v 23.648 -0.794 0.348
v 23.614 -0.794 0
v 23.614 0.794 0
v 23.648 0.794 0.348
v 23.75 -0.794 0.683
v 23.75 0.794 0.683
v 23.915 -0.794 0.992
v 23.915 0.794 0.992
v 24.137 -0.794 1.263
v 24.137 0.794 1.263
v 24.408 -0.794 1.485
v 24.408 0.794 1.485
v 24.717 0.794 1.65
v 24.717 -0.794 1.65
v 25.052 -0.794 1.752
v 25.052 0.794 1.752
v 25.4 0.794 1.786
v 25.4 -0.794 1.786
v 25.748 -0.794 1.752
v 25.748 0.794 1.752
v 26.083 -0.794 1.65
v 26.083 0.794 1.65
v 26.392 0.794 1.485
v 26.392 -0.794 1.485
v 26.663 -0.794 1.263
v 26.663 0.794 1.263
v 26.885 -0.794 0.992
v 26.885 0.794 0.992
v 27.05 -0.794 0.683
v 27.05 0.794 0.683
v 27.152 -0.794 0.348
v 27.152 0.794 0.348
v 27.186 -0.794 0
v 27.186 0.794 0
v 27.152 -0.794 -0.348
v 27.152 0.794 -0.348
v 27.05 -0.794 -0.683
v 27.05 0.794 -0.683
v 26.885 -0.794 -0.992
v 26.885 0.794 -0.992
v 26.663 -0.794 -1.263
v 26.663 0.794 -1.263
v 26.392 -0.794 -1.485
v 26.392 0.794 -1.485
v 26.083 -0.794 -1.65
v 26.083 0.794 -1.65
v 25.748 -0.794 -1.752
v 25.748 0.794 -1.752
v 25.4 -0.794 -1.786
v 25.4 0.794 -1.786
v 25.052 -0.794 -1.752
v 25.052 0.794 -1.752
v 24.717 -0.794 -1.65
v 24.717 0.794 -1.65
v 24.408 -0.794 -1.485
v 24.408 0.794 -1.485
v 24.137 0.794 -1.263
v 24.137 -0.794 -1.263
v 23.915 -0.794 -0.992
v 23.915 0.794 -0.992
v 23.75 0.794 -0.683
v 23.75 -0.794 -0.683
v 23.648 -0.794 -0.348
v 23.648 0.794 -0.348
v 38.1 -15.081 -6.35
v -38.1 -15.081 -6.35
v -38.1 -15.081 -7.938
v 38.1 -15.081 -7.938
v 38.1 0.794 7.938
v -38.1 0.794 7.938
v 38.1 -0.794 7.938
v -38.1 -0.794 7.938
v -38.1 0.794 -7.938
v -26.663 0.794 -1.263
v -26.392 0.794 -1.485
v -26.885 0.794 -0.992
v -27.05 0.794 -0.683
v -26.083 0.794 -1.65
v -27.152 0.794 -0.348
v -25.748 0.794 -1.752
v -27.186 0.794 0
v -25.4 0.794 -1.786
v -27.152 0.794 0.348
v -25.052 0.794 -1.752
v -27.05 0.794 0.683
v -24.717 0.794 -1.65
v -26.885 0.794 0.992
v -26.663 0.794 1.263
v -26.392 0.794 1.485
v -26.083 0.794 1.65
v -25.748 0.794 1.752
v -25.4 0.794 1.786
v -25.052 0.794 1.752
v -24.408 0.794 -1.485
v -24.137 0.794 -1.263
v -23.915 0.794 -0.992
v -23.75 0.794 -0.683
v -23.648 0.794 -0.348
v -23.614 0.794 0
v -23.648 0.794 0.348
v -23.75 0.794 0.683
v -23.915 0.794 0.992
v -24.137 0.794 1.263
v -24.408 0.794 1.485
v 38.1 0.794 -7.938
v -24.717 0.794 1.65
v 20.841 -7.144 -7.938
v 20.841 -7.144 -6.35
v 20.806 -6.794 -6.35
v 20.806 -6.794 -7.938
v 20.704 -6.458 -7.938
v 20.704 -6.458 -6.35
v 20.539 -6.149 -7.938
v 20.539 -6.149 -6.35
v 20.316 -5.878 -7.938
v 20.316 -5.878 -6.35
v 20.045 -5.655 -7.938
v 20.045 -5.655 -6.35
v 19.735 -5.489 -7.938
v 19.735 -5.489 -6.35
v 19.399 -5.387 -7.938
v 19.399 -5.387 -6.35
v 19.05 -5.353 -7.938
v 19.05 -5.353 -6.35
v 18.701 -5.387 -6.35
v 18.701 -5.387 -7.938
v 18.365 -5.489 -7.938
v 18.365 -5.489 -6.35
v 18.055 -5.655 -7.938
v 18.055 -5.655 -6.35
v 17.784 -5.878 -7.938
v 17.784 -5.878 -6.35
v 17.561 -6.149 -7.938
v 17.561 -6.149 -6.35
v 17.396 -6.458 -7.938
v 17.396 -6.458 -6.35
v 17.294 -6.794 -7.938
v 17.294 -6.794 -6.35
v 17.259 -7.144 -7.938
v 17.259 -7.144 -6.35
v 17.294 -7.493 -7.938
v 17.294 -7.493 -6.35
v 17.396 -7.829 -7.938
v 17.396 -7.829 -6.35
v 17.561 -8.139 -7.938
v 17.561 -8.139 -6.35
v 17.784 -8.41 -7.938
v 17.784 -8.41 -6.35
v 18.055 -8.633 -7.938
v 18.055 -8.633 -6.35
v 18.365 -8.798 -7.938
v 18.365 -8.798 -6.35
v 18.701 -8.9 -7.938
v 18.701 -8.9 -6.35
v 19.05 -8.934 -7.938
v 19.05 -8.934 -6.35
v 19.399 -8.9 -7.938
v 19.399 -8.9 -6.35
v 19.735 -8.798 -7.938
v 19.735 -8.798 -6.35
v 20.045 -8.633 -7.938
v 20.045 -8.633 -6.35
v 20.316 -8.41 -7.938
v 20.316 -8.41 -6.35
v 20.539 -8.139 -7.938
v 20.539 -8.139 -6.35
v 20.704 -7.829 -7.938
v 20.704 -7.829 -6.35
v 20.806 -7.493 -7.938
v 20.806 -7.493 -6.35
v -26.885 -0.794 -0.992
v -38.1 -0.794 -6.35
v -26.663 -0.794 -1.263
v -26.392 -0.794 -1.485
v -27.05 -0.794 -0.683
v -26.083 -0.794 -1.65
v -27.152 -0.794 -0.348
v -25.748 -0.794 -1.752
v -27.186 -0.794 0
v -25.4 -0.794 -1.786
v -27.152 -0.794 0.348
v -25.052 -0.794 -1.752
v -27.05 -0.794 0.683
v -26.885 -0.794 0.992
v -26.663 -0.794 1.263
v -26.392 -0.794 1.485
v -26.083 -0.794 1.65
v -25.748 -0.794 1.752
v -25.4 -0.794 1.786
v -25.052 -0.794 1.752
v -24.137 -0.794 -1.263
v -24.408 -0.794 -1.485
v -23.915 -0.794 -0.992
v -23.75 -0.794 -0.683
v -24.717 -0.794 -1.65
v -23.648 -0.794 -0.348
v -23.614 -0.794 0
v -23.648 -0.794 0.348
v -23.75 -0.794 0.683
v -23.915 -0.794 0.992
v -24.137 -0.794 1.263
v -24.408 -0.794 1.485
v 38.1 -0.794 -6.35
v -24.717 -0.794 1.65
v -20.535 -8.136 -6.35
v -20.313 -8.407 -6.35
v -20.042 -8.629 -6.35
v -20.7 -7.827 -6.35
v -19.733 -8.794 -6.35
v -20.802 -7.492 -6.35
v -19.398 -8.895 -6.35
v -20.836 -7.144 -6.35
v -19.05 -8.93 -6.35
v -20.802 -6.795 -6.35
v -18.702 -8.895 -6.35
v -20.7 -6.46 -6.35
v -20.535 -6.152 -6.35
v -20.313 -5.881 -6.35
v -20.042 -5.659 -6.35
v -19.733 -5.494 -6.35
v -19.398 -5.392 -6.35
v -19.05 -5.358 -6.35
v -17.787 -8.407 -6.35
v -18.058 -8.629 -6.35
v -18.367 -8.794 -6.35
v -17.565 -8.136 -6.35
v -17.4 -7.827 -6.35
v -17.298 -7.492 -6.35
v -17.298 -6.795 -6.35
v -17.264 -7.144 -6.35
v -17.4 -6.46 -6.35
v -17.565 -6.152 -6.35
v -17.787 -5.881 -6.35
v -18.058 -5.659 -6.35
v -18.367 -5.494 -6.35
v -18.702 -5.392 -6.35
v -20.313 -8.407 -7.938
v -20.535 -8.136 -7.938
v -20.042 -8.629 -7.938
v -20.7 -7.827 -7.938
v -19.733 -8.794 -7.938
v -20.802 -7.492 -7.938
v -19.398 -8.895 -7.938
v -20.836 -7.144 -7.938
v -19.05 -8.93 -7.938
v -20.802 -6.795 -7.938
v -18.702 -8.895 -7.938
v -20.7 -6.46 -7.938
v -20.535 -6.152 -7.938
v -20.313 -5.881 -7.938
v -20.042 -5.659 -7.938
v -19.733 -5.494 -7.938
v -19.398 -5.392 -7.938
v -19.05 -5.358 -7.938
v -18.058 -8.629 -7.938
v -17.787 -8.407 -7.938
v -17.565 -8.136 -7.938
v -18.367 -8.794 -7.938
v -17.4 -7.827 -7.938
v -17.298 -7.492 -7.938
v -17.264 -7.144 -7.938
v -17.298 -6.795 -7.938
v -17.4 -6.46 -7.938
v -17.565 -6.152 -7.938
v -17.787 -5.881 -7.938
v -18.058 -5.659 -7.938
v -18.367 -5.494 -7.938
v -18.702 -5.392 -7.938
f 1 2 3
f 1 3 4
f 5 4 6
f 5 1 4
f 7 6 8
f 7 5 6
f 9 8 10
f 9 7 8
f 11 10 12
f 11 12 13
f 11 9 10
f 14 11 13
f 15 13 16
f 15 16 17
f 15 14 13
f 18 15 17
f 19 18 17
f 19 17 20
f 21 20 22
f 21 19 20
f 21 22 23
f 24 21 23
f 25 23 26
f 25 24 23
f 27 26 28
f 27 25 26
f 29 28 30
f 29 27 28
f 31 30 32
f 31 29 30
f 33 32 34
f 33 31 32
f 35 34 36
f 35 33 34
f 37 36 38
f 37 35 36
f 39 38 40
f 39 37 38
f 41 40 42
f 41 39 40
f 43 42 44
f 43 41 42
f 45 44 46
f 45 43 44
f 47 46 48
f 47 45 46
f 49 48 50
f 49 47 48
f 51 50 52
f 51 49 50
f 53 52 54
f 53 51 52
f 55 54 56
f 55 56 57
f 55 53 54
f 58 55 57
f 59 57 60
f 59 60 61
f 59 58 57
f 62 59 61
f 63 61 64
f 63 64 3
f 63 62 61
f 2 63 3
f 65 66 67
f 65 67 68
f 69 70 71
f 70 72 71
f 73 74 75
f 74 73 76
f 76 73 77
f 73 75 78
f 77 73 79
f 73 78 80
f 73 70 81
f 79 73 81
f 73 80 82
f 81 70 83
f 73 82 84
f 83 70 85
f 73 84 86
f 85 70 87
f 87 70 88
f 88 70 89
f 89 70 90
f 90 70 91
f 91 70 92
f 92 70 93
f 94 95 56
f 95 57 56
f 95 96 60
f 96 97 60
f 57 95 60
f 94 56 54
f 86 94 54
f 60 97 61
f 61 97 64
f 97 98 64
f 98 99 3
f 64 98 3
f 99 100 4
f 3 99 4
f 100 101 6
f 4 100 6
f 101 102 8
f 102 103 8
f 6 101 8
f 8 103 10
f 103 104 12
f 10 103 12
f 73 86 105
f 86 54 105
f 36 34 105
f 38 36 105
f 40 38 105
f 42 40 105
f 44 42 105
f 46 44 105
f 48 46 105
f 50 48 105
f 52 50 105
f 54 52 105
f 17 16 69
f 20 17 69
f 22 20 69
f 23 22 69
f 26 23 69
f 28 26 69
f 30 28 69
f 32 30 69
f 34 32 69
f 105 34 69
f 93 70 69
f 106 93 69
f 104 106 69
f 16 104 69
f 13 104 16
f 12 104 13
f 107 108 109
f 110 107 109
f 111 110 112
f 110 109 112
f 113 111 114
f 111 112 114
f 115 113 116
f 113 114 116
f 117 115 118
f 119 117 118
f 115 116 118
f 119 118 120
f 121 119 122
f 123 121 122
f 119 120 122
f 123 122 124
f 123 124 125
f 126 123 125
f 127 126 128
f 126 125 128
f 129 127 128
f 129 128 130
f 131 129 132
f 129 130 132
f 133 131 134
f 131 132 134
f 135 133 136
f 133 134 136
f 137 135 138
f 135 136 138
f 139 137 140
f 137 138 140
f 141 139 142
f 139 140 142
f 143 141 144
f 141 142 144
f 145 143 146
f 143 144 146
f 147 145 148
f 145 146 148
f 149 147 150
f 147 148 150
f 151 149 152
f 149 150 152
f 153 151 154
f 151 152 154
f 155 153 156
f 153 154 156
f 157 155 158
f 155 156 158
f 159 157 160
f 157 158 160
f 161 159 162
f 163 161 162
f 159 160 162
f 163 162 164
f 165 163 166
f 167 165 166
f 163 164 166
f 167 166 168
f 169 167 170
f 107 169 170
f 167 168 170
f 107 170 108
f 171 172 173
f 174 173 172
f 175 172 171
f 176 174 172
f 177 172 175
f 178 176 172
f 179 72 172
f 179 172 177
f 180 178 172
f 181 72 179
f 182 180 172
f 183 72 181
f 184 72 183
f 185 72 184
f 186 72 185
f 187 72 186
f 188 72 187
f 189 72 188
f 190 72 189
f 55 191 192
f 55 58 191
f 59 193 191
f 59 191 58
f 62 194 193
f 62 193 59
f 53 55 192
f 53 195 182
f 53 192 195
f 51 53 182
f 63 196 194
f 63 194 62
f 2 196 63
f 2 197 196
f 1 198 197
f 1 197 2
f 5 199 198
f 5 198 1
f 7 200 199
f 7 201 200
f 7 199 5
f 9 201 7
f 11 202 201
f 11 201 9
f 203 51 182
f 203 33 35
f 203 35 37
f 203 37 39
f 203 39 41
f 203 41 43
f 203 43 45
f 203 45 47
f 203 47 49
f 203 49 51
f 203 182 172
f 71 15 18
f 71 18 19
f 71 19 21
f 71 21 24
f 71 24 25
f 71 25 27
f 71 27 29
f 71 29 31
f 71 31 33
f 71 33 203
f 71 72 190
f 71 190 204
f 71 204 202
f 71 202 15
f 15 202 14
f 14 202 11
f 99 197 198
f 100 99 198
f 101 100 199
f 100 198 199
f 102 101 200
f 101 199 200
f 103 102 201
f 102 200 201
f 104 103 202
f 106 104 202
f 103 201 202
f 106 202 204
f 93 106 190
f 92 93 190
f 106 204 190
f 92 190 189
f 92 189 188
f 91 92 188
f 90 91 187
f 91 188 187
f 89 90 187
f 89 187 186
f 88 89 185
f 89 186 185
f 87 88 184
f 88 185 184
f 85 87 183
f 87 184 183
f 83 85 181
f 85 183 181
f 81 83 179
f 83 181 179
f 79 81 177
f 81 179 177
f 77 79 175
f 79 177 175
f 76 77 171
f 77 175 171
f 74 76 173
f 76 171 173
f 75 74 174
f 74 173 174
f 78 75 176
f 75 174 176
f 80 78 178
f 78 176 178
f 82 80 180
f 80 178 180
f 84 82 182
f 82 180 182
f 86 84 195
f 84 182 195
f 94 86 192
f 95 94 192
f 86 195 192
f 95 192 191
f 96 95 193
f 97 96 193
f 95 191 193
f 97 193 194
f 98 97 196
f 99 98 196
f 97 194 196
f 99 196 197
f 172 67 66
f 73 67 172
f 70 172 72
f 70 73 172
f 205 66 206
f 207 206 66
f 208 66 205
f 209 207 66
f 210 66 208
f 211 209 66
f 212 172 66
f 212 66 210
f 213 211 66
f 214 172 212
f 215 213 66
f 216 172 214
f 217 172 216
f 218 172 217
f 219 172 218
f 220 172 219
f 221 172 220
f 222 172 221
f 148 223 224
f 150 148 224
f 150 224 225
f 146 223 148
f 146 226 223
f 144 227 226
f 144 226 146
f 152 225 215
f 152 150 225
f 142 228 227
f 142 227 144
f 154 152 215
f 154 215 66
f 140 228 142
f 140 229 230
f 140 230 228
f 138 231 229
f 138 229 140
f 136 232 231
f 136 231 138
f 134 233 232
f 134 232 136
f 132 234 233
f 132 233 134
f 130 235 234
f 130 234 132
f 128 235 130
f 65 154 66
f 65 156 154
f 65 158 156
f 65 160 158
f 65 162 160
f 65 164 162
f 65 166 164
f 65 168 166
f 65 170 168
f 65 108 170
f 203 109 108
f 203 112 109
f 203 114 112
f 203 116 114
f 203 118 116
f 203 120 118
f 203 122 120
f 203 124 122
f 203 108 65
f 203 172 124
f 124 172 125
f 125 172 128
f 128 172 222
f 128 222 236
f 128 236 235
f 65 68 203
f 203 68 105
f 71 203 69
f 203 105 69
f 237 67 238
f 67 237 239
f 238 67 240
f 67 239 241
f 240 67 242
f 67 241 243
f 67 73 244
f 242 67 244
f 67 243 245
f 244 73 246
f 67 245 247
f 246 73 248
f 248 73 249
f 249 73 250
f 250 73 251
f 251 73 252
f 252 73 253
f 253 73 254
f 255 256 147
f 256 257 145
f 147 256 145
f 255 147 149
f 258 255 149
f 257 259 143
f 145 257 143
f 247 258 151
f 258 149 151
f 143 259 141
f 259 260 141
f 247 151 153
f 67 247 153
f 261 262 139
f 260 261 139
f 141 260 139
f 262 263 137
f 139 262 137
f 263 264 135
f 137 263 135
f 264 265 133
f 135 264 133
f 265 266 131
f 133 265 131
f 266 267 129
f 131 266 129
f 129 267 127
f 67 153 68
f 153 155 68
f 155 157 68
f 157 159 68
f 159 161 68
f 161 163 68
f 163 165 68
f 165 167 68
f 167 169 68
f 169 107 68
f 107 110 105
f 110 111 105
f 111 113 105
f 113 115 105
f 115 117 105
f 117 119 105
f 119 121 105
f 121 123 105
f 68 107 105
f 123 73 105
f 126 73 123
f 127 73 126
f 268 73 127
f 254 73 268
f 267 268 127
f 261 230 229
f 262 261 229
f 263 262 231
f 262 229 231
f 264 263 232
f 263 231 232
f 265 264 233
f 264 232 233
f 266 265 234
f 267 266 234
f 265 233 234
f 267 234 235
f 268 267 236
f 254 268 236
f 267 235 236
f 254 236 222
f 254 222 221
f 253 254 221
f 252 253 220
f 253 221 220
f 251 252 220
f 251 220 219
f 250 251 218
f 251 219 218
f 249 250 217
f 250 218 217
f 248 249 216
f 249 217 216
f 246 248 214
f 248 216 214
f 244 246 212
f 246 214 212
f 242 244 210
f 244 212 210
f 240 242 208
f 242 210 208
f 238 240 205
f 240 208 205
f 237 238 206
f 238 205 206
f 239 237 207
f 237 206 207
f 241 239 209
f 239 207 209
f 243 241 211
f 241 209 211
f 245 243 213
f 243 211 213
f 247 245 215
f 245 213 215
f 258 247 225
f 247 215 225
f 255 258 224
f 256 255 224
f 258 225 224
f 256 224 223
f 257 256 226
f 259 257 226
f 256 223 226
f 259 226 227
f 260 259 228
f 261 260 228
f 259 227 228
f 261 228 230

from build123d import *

# Parameters (mm, degrees)
F0_W     = 76.2
F0_H     = 15.875
F1_DEPTH = 0.79375
F2_R     = 1.7859375
F3_DEPTH = 1.5875
F4_W     = 76.2
F4_H     = 1.5875
F5_DEPTH = 14.2875
F6_R     = 1.7859375
F6_R_2   = 1.7907
F7_DEPTH = 1.5875


# Not quite as in the source:
# - a pattern or mirror of a feature is missing from the dataset's text; its kind, count and spacing are read off the source's solid


with BuildPart() as f1:
    # F0 (on Front) → F1 (new body, symmetric)
    with BuildSketch(Plane.XZ):
        Rectangle(F0_W, F0_H)
    extrude(amount=F1_DEPTH, both=True)

    # F2 (on face) → F3 (cut, through all)
    with BuildSketch(Plane.XZ.offset(0.79375)):
        with Locations((-25.4, 0)):
            Circle(F2_R)
    f3 = extrude(amount=-F3_DEPTH, mode=Mode.SUBTRACT)

    # F3_copies: F3 across plane
    add(f3.mirror(Plane(origin=(0, 0, 0), x_dir=(0, 0, 1), z_dir=(1, 0, 0))), mode=Mode.SUBTRACT)

    # F4 (on face) → F5 (join)
    with BuildSketch(Plane.XZ.offset(0.79375)):
        with Locations((0, -7.14375)):
            Rectangle(F4_W, F4_H)
    extrude(amount=F5_DEPTH)

    # F6 (on face) → F7 (cut, through all)
    with BuildSketch(Plane.XY.offset(-6.35)):
        with Locations((-19.05, -7.14375)):
            Circle(F6_R)
        with Locations((19.05, -7.14375)):
            Circle(F6_R_2)
    extrude(amount=-F7_DEPTH, mode=Mode.SUBTRACT)


solid = f1.part
